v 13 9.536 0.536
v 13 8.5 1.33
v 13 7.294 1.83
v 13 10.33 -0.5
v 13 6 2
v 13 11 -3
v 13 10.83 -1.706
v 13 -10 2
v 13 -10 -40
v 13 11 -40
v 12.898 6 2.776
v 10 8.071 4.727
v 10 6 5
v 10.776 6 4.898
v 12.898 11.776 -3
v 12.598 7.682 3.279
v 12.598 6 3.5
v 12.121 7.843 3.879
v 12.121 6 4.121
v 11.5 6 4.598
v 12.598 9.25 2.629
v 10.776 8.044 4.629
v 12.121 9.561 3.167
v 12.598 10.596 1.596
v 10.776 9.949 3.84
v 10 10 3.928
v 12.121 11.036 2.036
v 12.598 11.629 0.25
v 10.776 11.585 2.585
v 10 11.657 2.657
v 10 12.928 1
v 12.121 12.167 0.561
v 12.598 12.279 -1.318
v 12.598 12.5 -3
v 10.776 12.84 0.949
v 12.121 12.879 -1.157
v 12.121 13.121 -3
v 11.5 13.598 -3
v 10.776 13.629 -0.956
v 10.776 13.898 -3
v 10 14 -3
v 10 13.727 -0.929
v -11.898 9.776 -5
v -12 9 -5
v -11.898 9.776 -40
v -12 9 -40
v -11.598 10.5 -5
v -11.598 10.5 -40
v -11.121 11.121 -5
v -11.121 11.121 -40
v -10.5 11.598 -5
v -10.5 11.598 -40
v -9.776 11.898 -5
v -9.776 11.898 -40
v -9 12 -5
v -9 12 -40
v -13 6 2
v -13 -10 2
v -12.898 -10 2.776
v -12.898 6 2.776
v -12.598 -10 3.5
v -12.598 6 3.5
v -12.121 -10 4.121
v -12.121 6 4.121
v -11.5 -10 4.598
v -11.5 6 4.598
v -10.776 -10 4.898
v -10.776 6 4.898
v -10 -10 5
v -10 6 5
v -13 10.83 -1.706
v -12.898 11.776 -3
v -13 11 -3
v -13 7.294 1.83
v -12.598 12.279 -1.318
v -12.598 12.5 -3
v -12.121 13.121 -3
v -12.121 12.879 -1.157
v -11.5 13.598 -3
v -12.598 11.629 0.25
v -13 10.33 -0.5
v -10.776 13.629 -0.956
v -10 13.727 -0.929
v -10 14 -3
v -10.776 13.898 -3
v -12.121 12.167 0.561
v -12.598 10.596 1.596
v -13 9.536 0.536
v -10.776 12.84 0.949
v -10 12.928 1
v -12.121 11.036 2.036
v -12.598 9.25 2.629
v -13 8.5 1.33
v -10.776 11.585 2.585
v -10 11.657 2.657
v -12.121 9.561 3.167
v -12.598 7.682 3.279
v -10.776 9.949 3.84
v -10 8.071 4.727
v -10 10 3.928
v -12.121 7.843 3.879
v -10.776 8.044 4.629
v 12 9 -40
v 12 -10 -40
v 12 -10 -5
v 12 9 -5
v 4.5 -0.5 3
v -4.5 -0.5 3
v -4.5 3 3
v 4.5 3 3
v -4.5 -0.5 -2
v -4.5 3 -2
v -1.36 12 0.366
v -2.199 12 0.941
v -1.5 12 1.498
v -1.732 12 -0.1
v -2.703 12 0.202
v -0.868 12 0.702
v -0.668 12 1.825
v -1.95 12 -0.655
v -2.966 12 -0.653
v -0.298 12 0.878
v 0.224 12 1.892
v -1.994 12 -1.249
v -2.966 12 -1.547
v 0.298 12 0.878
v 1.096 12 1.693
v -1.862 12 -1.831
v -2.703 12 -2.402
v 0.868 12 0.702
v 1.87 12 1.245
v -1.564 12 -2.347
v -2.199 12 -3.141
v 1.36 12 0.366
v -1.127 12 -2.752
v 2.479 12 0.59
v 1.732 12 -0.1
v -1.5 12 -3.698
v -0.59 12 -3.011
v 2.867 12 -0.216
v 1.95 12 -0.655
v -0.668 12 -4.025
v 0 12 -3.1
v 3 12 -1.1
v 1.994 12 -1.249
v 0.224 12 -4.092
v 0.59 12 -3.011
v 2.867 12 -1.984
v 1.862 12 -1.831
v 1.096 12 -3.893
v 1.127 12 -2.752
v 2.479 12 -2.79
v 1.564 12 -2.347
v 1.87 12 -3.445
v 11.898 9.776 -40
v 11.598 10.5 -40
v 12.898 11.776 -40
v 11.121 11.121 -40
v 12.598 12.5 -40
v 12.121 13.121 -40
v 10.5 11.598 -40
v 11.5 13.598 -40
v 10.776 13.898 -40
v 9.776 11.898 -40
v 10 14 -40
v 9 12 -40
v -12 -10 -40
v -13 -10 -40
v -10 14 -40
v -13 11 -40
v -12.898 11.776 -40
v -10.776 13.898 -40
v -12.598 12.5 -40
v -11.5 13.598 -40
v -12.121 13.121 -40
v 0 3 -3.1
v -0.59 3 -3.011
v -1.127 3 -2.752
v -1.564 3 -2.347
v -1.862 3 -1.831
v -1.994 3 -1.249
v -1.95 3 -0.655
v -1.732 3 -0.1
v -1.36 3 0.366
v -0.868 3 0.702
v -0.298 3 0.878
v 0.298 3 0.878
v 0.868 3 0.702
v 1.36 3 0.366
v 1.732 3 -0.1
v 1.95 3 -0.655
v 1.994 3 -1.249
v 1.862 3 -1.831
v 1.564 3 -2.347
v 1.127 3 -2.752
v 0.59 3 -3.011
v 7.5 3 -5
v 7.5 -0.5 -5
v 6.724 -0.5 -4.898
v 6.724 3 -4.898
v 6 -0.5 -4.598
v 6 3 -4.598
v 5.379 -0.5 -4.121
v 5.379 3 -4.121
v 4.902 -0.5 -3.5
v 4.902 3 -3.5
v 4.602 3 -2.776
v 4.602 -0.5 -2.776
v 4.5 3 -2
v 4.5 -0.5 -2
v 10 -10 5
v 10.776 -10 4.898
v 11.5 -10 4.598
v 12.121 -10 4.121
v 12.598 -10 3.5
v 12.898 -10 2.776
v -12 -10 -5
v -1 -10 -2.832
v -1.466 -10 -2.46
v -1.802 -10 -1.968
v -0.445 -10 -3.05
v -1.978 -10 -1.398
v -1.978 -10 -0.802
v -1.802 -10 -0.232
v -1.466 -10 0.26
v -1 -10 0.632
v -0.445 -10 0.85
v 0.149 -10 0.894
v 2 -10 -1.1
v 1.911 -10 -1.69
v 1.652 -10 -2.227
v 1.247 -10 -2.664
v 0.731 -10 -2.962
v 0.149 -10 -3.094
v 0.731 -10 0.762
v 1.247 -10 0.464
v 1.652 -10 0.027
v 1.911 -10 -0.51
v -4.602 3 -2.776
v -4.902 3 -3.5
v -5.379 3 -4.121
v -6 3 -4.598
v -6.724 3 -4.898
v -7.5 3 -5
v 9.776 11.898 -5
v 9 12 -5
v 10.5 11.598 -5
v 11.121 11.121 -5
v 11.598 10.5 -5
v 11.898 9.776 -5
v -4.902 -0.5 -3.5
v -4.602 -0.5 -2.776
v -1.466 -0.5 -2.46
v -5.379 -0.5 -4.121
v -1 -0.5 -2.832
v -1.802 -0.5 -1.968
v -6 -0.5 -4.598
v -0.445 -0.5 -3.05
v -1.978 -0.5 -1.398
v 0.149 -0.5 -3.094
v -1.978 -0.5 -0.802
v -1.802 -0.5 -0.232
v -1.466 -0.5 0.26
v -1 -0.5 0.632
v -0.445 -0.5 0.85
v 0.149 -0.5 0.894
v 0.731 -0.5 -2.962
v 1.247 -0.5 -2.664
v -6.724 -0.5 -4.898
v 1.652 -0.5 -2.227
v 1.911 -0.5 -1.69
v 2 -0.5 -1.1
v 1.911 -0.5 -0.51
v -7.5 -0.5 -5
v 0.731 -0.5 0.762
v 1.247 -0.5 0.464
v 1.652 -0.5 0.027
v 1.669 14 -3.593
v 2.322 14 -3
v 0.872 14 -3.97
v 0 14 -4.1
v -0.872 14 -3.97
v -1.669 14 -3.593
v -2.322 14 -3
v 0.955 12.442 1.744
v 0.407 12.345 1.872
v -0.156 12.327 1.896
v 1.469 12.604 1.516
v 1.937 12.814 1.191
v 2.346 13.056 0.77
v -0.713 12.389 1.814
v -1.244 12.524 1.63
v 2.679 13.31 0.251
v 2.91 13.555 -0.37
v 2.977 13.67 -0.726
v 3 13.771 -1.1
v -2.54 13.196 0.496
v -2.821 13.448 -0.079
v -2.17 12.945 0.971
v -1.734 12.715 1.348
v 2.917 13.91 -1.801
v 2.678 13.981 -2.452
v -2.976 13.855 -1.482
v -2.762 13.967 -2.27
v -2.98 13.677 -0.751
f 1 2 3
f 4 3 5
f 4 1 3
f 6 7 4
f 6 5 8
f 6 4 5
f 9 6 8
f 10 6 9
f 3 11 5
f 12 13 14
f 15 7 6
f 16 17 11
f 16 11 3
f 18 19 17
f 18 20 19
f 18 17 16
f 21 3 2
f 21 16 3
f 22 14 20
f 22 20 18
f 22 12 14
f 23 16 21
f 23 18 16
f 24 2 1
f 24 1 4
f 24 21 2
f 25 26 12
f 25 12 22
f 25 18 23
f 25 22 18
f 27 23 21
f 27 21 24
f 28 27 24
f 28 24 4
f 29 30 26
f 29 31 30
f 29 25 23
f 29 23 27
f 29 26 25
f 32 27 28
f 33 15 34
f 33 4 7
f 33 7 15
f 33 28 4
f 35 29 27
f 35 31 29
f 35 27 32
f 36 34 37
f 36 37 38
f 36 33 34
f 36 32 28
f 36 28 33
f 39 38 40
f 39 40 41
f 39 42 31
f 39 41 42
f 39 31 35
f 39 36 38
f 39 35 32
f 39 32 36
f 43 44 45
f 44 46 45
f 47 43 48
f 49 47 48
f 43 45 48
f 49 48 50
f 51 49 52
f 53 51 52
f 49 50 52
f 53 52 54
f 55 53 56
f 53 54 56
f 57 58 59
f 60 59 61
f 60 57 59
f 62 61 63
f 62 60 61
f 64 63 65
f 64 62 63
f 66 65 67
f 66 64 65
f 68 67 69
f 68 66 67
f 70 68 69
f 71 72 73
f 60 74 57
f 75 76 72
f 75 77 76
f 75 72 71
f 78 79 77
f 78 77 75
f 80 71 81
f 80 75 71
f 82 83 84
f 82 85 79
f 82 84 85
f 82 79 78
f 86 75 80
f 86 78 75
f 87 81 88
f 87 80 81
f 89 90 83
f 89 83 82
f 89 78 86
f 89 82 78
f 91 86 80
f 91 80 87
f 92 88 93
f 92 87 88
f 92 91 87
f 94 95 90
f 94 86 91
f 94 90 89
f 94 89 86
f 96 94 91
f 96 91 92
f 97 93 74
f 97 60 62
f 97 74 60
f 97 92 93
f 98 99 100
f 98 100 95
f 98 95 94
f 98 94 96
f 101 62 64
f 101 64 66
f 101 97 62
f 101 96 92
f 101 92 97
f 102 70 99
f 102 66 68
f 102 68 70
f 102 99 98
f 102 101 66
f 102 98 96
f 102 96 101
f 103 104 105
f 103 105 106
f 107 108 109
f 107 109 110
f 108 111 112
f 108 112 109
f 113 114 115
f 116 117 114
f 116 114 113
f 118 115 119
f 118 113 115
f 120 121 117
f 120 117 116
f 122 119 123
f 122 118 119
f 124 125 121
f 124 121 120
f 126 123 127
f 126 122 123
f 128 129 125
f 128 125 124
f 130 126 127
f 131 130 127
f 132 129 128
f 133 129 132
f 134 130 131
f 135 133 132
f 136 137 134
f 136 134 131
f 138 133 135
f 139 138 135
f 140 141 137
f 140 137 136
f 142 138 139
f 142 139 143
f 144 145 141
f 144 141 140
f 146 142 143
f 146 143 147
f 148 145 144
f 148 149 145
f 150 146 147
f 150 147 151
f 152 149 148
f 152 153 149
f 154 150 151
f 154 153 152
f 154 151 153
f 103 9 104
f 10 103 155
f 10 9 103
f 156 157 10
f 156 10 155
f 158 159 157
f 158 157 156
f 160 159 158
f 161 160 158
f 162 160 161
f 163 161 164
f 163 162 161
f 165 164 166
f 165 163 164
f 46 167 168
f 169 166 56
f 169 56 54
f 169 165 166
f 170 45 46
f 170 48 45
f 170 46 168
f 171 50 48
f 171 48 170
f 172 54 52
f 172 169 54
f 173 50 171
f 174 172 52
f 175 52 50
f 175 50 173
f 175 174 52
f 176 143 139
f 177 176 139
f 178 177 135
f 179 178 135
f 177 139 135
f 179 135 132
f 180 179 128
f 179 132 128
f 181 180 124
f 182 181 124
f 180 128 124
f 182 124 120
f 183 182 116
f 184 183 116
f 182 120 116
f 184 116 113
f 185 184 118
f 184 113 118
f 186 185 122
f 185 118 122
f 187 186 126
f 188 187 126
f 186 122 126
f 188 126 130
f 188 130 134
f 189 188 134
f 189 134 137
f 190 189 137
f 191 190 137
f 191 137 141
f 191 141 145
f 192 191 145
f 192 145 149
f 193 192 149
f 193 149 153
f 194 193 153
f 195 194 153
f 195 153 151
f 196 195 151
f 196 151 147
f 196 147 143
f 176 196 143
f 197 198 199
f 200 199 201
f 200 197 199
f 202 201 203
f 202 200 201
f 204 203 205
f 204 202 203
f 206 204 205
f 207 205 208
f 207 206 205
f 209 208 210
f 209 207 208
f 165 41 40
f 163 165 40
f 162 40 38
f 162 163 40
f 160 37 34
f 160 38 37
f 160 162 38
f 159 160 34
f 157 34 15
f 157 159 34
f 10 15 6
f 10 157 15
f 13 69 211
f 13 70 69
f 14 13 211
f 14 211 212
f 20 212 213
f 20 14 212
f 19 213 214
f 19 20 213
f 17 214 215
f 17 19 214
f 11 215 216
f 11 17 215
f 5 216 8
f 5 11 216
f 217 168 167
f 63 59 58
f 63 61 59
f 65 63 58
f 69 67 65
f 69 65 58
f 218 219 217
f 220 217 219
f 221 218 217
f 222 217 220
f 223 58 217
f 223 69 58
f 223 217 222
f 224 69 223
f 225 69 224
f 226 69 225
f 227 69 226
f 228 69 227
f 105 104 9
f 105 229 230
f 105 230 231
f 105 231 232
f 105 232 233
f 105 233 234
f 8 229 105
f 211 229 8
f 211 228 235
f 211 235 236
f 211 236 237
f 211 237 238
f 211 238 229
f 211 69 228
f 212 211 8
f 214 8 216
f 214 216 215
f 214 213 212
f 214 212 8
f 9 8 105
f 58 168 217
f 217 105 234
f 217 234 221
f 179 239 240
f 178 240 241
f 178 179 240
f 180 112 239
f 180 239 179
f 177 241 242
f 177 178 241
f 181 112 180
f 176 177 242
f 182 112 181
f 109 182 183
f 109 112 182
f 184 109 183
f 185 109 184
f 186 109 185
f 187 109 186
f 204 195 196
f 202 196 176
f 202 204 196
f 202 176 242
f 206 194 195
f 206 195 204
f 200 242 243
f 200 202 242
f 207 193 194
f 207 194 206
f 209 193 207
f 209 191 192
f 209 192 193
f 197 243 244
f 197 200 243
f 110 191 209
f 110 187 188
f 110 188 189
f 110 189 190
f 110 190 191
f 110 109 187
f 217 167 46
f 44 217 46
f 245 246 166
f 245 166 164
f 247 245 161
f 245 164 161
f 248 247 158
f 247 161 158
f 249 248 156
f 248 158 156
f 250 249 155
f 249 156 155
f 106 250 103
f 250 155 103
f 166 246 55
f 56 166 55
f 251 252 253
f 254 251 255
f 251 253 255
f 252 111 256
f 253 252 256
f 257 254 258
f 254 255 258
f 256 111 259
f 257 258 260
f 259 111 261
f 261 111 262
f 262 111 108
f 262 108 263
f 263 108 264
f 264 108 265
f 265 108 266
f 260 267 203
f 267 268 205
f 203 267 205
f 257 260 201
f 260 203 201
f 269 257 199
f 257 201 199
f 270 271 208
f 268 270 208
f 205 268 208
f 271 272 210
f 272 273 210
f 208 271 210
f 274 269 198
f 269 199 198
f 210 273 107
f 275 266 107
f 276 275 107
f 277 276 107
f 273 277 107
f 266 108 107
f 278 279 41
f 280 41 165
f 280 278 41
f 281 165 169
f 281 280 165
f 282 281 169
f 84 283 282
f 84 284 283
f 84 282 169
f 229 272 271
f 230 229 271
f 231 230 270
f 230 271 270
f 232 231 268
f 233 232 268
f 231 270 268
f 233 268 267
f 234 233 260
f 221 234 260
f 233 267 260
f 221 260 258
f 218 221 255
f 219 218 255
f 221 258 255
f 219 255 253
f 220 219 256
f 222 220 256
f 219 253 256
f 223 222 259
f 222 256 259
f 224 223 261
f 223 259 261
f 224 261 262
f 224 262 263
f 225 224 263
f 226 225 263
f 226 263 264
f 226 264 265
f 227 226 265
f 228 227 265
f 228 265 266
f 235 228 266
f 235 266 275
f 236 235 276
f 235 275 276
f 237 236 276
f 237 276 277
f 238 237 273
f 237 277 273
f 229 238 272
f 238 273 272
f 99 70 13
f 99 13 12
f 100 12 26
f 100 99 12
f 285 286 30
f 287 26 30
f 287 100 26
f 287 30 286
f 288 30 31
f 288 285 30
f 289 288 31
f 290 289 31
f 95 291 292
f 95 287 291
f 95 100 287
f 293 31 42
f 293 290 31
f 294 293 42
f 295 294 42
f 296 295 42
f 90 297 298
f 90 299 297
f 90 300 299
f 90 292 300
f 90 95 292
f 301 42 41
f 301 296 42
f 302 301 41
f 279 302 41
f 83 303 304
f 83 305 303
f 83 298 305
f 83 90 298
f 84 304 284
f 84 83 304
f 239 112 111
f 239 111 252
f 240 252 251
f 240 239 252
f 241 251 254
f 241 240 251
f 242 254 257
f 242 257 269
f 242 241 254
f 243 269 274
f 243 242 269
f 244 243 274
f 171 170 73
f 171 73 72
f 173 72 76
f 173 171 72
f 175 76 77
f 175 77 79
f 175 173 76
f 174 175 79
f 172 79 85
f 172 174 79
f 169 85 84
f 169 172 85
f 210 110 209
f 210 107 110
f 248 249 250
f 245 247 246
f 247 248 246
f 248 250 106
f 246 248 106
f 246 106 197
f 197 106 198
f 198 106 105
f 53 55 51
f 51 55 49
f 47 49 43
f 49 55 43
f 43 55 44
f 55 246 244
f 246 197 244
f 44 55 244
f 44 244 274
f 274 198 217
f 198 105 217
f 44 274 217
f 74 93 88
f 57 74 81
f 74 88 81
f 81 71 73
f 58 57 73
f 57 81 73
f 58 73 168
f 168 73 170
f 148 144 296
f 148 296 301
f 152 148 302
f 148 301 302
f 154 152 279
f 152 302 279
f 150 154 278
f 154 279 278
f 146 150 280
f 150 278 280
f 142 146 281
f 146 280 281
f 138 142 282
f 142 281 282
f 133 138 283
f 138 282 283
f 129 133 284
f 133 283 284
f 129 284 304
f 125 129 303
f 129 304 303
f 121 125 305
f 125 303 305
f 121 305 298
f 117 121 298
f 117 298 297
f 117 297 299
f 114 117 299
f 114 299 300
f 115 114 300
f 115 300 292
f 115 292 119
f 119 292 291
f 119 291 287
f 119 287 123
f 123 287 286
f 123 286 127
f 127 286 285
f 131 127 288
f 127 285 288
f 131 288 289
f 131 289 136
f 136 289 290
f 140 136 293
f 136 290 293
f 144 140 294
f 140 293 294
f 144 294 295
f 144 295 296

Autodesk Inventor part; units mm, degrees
ref_plane "YZ Plane" through (0, 0, 0) normal (1, 0, 0) x (0, 1, 0)
ref_plane "XZ Plane" through (0, 0, 0) normal (0, 1, 0) x (-1, 0, 0)
ref_plane "XY Plane" through (0, 0, 0) normal (0, 0, 1) x (1, 0, 0)
sketch "Sketch1" plane through (0, 0, 0) normal (0, 1, 0) x (-1, 0, 0)
  line L0 (-13, -5) -> (13, -5)
  line L1 (13, -5) -> (13, 5)
  line L2 (13, 5) -> (-13, 5)
  line L3 (-13, 5) -> (-13, -5)
  line L4 (-13, -5) -> (13, 5) construction
  line L5 (13, -5) -> (-13, 5) construction
  point P0 (0, 0)
  dimension "d0" = 26
  dimension "d1" = 10
extrude "Extrusion1" add sketch "Sketch1" along normal blind 14
sketch "Sketch2" plane through (0, 0, 0) normal (0, -1, 0) x (1, 0, 0)
  line L0 (13, -5) -> (-13, -5) projected
  line L1 (13, 5) -> (13, -5) projected
  line L2 (-13, 5) -> (13, 5) projected
  line L3 (-13, -5) -> (-13, 5) projected
  line L4 (-4.5, 3) -> (4.5, 3)
  line L5 (4.5, 3) -> (4.5, -5)
  line L6 (4.5, -5) -> (-4.5, -5)
  line L7 (-4.5, -5) -> (-4.5, 3)
  line L8 (-4.5, 3) -> (4.5, -5) construction
  line L9 (4.5, 3) -> (-4.5, -5) construction
  point P0 (0, 0)
  point P1 (0, -1)
  dimension "d4" = 9
  dimension "d5" = 4.5
  dimension "d6" = 8
extrude "Extrusion2" cut sketch "Sketch2" against normal blind 3 contours L0 L7 L4 L5
fillet "Fillet1" radius 3 2 edges at (-4.5, 1.5, -5) (4.5, 1.5, -5)
sketch "Sketch3" plane through (0, 3, 0) normal (0, -1, 0) x (1, 0, 0)
  line L0 (-4.5, 3) -> (4.5, 3) projected
  point P0 (0, 0)
  point P1 (0, -1.1)
  dimension "d10" = 4.1
hole "Hole1" at (0, 3, -1.1) direction (0, 1, 0) diameter 4 end through all
sketch "Sketch4" plane through (13, 14, -5) normal (0, 0, -1) x (-1, 0, 0)
  line L0 (5.5, -11) -> (20.5, -11) projected
  line L1 (20.5, -14) -> (20.5, -11) projected
  line L2 (20.5, -14) -> (26, -14) projected
  line L3 (26, -14) -> (26, 0) projected
  line L4 (0, 0) -> (26, 0) projected
  line L5 (0, -14) -> (0, 0) projected
  line L6 (0, -14) -> (5.5, -14) projected
  line L7 (5.5, -11) -> (5.5, -14) projected
  line L8 (0, -14) -> (0, 0) projected
  line L9 (0, -14) -> (1, -14)
  line L10 (1, -14) -> (1, 0)
  line L11 (1, 0) -> (0, 0)
  line L12 (0, 0) -> (0, -14)
  line L13 (20.5, -14) -> (26, -14) projected
  line L14 (26, -14) -> (25, -14)
  line L15 (25, -14) -> (25, 0)
  line L16 (25, 0) -> (26, 0)
  line L17 (26, 0) -> (26, -14)
  line L18 (1, -2) -> (25, -2)
  line L19 (25, -2) -> (25, 0)
  line L20 (25, 0) -> (1, 0)
  line L21 (1, 0) -> (1, -2)
  point P0 (13, -14)
  dimension "d18" = 1
  dimension "d19" = 1
  dimension "d20" = 2
extrude "Extrusion3" add sketch "Sketch4" along normal blind 35 contours L6 L5 L4 L10 | L15 L4 L3 L2 | L10 L4 L15 L18
sketch "Sketch5" plane through (0, 14, 0) normal (0, 1, 0) x (1, 0, 0)
  circle A0 centre (0, 1.1) radius 2 projected
  circle A1 centre (0, 1.1) radius 3
  point P0 (0, 0)
  dimension "d23" = 6
extrude "Extrusion4" cut sketch "Sketch5" against normal blind 2
fillet "Fillet2" radius 8 1 edges at (0, 14, 5)
sketch "Sketch6" plane through (0, 0, 0) normal (0, -1, 0) x (1, 0, 0)
  arc A0 (4.5, -2) -> (7.5, -5) centre (7.5, -2) ccw projected
  line L0 (12, -5) -> (7.5, -5) projected
  line L1 (12, -5) -> (12, -40) projected
  line L2 (13, -40) -> (12, -40) projected
  line L3 (13, 5) -> (13, -40) projected
  line L4 (-13, 5) -> (13, 5) projected
  line L5 (-13, 5) -> (-13, -40) projected
  line L6 (-12, -40) -> (-13, -40) projected
  line L7 (-12, -5) -> (-12, -40) projected
  line L8 (-7.5, -5) -> (-12, -5) projected
  arc A1 (-7.5, -5) -> (-4.5, -2) centre (-7.5, -2) ccw projected
  line L9 (-4.5, -2) -> (-4.5, 3) projected
  line L10 (-4.5, 3) -> (4.5, 3) projected
  line L11 (4.5, 3) -> (4.5, -2) projected
  point P0 (0, 0)
extrude "Extrusion5" add sketch "Sketch6" along normal blind 10
fillet "Fillet3" radius 3 2 edges at (12, 12, -22.5) (-12, 12, -22.5)
fillet "Fillet4" radius 3 6 edges at (13, 11.6569, 2.6569) (13, -2, 5) (13, 14, -21.5) (-13, 11.6569, 2.6569) (-13, -2, 5) (-13, 14, -21.5)
sketch "Sketch7" plane through (0, -10, 0) normal (0, -1, 0) x (1, 0, 0)
  point P0 (0, 0)
sketch "Sketch8" plane through (0, -10, 0) normal (0, -1, 0) x (1, 0, 0)
  line L0 (9.9543, -5) -> (-10.0457, -5)
  line L1 (-10.0457, -5) -> (-10.0457, 4.3303)
  line L2 (-10.0457, 4.3303) -> (9.9543, 4.3303)
  line L3 (9.9543, 4.3303) -> (9.9543, -5)
  line L4 (7.5, -5) -> (-7.5, -5) projected
  point P0 (0, 0)
  dimension "d33" = 20
  dimension "d34" = 0
extrude "Extrusion6" add sketch "Sketch8" against normal blind 9.5
sketch "Sketch9" plane through (0, 3, 0) normal (0, -1, 0) x (1, 0, 0)
  circle A0 centre (0, -1.1) radius 2 projected
  point P0 (0, 0)
extrude "Extrusion7" cut sketch "Sketch9" along normal through all
properties part number "little_rays_shell"
